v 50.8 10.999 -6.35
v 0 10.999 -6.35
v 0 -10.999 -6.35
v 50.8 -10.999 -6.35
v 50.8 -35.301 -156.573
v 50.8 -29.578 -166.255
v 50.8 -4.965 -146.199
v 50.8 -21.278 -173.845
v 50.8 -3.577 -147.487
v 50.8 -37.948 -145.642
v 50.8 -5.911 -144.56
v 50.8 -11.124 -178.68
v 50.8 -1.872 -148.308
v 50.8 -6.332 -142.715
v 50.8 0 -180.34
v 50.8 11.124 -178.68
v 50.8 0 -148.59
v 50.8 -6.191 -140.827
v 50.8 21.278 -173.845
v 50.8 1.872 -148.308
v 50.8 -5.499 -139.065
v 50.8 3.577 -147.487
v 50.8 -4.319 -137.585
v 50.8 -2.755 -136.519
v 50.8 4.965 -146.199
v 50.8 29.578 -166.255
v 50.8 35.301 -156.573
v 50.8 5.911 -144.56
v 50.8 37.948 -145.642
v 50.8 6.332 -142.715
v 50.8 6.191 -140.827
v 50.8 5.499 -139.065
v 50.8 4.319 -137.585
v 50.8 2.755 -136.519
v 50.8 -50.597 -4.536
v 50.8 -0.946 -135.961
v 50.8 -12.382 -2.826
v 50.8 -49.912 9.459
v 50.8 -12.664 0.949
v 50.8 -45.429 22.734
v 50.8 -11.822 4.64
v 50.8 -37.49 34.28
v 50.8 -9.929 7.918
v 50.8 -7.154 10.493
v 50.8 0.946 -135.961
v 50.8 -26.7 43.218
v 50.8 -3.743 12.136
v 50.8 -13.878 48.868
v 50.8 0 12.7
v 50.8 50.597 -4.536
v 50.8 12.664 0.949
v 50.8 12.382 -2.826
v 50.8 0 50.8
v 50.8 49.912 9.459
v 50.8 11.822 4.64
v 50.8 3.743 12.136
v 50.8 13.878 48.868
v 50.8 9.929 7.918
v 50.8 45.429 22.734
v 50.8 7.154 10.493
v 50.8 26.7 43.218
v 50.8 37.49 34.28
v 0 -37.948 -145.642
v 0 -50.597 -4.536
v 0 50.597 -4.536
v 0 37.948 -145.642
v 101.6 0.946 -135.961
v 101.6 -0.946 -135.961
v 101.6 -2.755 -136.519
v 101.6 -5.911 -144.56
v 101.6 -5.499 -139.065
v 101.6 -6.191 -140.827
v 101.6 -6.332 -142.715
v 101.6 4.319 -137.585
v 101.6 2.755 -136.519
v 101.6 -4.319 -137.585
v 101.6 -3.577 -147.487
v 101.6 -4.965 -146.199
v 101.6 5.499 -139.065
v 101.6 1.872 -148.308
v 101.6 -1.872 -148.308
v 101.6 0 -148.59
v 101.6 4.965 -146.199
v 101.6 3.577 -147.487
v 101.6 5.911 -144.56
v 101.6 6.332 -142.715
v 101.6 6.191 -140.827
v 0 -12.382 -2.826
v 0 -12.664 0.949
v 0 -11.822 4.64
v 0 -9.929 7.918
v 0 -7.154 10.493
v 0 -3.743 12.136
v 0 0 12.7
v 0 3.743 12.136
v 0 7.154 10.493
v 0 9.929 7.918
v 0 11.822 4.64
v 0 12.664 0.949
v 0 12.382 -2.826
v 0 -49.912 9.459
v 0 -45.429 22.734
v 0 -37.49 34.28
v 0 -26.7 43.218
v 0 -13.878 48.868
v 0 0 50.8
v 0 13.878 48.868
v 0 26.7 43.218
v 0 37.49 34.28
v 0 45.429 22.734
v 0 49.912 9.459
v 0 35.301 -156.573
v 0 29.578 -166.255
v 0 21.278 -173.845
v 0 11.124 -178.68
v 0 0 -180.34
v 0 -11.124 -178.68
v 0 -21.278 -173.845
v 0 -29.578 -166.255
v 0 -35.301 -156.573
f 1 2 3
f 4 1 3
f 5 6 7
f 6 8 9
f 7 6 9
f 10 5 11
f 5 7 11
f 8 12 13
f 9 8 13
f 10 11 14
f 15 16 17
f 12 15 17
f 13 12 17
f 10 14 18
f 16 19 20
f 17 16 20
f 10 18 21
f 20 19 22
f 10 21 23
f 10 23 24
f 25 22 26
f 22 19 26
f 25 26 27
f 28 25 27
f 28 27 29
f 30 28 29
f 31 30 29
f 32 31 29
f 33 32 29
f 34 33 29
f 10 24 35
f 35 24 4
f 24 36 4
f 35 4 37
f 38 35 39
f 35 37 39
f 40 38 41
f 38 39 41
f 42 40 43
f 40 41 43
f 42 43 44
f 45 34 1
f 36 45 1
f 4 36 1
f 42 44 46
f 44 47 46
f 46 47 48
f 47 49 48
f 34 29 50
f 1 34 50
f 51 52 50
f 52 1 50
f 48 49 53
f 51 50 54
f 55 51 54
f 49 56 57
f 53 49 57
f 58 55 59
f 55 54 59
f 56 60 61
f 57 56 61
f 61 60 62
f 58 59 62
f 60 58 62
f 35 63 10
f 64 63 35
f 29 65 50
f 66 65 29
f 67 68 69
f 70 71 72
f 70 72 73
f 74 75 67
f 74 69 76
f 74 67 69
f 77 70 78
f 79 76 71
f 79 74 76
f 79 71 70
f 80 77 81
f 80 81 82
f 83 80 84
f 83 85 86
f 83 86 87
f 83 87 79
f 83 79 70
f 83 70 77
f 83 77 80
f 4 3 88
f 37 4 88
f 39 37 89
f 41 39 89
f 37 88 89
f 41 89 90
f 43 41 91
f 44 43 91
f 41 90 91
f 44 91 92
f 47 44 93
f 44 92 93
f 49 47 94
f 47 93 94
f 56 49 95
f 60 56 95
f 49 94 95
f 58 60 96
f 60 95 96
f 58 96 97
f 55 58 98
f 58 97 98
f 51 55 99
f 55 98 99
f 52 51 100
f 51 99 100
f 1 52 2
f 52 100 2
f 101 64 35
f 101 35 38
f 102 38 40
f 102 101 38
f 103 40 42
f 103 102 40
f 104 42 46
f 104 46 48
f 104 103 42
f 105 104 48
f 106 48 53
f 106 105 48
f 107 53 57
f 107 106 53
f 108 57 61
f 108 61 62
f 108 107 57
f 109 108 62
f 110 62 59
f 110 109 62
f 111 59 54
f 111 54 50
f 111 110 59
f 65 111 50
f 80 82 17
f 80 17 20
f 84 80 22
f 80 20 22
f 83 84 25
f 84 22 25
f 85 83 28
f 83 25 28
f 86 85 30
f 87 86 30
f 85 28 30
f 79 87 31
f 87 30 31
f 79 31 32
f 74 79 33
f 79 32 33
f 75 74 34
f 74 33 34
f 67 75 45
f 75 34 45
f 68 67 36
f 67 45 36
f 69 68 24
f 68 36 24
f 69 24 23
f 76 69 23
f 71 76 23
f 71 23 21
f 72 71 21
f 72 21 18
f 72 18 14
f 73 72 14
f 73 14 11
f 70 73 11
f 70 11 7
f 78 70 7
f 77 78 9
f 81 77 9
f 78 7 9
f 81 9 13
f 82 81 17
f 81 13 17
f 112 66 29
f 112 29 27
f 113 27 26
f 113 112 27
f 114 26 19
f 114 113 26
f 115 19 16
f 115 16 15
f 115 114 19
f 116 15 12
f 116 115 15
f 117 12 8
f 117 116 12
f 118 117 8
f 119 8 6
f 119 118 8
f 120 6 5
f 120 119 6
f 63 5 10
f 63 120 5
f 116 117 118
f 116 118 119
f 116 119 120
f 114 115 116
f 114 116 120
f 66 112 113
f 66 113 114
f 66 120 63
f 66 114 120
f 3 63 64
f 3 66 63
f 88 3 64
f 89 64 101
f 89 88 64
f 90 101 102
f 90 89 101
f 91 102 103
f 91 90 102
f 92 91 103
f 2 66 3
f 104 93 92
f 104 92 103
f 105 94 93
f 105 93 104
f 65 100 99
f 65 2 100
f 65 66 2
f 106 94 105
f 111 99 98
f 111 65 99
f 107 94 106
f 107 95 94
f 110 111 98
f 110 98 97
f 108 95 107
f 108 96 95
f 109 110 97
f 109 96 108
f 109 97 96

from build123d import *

# Parameters (mm, degrees)
BOSS_EXTRUDE1_DEPTH = 50.8
SKETCH2_R           = 6.35
BOSS_EXTRUDE2_DEPTH = 50.8


with BuildPart() as part:
    # Sketch1 → Boss-Extrude1 (new body)
    with BuildSketch(Plane(origin=(0, 0, 0), x_dir=(0, 0, -1), z_dir=(1, 0, 0))):
        with BuildLine():
            Line((4.535714286, 50.597107585), (145.641785714, 37.947830688))
            ThreePointArc((145.641785714, 37.947830688), (180.34, 0), (145.641785714, -37.947830688))
            Line((145.641785714, -37.947830688), (4.535714286, -50.597107585))
            ThreePointArc((4.535714286, -50.597107585), (-50.8, 0), (4.535714286, 50.597107585))
        make_face()
        with BuildLine():
            Line((6.35, 10.998522628), (6.35, -10.998522628))
            ThreePointArc((6.35, -10.998522628), (-12.7, 0), (6.35, 10.998522628))
        make_face(mode=Mode.SUBTRACT)
    extrude(amount=BOSS_EXTRUDE1_DEPTH)

    # Sketch2 → Boss-Extrude2 (add)
    with BuildSketch(Plane(origin=(50.8, 0, 0), x_dir=(0, 0, -1), z_dir=(1, 0, 0))):
        with Locations((142.24, 0)):
            Circle(SKETCH2_R)
    extrude(amount=BOSS_EXTRUDE2_DEPTH)


solid = part.part
